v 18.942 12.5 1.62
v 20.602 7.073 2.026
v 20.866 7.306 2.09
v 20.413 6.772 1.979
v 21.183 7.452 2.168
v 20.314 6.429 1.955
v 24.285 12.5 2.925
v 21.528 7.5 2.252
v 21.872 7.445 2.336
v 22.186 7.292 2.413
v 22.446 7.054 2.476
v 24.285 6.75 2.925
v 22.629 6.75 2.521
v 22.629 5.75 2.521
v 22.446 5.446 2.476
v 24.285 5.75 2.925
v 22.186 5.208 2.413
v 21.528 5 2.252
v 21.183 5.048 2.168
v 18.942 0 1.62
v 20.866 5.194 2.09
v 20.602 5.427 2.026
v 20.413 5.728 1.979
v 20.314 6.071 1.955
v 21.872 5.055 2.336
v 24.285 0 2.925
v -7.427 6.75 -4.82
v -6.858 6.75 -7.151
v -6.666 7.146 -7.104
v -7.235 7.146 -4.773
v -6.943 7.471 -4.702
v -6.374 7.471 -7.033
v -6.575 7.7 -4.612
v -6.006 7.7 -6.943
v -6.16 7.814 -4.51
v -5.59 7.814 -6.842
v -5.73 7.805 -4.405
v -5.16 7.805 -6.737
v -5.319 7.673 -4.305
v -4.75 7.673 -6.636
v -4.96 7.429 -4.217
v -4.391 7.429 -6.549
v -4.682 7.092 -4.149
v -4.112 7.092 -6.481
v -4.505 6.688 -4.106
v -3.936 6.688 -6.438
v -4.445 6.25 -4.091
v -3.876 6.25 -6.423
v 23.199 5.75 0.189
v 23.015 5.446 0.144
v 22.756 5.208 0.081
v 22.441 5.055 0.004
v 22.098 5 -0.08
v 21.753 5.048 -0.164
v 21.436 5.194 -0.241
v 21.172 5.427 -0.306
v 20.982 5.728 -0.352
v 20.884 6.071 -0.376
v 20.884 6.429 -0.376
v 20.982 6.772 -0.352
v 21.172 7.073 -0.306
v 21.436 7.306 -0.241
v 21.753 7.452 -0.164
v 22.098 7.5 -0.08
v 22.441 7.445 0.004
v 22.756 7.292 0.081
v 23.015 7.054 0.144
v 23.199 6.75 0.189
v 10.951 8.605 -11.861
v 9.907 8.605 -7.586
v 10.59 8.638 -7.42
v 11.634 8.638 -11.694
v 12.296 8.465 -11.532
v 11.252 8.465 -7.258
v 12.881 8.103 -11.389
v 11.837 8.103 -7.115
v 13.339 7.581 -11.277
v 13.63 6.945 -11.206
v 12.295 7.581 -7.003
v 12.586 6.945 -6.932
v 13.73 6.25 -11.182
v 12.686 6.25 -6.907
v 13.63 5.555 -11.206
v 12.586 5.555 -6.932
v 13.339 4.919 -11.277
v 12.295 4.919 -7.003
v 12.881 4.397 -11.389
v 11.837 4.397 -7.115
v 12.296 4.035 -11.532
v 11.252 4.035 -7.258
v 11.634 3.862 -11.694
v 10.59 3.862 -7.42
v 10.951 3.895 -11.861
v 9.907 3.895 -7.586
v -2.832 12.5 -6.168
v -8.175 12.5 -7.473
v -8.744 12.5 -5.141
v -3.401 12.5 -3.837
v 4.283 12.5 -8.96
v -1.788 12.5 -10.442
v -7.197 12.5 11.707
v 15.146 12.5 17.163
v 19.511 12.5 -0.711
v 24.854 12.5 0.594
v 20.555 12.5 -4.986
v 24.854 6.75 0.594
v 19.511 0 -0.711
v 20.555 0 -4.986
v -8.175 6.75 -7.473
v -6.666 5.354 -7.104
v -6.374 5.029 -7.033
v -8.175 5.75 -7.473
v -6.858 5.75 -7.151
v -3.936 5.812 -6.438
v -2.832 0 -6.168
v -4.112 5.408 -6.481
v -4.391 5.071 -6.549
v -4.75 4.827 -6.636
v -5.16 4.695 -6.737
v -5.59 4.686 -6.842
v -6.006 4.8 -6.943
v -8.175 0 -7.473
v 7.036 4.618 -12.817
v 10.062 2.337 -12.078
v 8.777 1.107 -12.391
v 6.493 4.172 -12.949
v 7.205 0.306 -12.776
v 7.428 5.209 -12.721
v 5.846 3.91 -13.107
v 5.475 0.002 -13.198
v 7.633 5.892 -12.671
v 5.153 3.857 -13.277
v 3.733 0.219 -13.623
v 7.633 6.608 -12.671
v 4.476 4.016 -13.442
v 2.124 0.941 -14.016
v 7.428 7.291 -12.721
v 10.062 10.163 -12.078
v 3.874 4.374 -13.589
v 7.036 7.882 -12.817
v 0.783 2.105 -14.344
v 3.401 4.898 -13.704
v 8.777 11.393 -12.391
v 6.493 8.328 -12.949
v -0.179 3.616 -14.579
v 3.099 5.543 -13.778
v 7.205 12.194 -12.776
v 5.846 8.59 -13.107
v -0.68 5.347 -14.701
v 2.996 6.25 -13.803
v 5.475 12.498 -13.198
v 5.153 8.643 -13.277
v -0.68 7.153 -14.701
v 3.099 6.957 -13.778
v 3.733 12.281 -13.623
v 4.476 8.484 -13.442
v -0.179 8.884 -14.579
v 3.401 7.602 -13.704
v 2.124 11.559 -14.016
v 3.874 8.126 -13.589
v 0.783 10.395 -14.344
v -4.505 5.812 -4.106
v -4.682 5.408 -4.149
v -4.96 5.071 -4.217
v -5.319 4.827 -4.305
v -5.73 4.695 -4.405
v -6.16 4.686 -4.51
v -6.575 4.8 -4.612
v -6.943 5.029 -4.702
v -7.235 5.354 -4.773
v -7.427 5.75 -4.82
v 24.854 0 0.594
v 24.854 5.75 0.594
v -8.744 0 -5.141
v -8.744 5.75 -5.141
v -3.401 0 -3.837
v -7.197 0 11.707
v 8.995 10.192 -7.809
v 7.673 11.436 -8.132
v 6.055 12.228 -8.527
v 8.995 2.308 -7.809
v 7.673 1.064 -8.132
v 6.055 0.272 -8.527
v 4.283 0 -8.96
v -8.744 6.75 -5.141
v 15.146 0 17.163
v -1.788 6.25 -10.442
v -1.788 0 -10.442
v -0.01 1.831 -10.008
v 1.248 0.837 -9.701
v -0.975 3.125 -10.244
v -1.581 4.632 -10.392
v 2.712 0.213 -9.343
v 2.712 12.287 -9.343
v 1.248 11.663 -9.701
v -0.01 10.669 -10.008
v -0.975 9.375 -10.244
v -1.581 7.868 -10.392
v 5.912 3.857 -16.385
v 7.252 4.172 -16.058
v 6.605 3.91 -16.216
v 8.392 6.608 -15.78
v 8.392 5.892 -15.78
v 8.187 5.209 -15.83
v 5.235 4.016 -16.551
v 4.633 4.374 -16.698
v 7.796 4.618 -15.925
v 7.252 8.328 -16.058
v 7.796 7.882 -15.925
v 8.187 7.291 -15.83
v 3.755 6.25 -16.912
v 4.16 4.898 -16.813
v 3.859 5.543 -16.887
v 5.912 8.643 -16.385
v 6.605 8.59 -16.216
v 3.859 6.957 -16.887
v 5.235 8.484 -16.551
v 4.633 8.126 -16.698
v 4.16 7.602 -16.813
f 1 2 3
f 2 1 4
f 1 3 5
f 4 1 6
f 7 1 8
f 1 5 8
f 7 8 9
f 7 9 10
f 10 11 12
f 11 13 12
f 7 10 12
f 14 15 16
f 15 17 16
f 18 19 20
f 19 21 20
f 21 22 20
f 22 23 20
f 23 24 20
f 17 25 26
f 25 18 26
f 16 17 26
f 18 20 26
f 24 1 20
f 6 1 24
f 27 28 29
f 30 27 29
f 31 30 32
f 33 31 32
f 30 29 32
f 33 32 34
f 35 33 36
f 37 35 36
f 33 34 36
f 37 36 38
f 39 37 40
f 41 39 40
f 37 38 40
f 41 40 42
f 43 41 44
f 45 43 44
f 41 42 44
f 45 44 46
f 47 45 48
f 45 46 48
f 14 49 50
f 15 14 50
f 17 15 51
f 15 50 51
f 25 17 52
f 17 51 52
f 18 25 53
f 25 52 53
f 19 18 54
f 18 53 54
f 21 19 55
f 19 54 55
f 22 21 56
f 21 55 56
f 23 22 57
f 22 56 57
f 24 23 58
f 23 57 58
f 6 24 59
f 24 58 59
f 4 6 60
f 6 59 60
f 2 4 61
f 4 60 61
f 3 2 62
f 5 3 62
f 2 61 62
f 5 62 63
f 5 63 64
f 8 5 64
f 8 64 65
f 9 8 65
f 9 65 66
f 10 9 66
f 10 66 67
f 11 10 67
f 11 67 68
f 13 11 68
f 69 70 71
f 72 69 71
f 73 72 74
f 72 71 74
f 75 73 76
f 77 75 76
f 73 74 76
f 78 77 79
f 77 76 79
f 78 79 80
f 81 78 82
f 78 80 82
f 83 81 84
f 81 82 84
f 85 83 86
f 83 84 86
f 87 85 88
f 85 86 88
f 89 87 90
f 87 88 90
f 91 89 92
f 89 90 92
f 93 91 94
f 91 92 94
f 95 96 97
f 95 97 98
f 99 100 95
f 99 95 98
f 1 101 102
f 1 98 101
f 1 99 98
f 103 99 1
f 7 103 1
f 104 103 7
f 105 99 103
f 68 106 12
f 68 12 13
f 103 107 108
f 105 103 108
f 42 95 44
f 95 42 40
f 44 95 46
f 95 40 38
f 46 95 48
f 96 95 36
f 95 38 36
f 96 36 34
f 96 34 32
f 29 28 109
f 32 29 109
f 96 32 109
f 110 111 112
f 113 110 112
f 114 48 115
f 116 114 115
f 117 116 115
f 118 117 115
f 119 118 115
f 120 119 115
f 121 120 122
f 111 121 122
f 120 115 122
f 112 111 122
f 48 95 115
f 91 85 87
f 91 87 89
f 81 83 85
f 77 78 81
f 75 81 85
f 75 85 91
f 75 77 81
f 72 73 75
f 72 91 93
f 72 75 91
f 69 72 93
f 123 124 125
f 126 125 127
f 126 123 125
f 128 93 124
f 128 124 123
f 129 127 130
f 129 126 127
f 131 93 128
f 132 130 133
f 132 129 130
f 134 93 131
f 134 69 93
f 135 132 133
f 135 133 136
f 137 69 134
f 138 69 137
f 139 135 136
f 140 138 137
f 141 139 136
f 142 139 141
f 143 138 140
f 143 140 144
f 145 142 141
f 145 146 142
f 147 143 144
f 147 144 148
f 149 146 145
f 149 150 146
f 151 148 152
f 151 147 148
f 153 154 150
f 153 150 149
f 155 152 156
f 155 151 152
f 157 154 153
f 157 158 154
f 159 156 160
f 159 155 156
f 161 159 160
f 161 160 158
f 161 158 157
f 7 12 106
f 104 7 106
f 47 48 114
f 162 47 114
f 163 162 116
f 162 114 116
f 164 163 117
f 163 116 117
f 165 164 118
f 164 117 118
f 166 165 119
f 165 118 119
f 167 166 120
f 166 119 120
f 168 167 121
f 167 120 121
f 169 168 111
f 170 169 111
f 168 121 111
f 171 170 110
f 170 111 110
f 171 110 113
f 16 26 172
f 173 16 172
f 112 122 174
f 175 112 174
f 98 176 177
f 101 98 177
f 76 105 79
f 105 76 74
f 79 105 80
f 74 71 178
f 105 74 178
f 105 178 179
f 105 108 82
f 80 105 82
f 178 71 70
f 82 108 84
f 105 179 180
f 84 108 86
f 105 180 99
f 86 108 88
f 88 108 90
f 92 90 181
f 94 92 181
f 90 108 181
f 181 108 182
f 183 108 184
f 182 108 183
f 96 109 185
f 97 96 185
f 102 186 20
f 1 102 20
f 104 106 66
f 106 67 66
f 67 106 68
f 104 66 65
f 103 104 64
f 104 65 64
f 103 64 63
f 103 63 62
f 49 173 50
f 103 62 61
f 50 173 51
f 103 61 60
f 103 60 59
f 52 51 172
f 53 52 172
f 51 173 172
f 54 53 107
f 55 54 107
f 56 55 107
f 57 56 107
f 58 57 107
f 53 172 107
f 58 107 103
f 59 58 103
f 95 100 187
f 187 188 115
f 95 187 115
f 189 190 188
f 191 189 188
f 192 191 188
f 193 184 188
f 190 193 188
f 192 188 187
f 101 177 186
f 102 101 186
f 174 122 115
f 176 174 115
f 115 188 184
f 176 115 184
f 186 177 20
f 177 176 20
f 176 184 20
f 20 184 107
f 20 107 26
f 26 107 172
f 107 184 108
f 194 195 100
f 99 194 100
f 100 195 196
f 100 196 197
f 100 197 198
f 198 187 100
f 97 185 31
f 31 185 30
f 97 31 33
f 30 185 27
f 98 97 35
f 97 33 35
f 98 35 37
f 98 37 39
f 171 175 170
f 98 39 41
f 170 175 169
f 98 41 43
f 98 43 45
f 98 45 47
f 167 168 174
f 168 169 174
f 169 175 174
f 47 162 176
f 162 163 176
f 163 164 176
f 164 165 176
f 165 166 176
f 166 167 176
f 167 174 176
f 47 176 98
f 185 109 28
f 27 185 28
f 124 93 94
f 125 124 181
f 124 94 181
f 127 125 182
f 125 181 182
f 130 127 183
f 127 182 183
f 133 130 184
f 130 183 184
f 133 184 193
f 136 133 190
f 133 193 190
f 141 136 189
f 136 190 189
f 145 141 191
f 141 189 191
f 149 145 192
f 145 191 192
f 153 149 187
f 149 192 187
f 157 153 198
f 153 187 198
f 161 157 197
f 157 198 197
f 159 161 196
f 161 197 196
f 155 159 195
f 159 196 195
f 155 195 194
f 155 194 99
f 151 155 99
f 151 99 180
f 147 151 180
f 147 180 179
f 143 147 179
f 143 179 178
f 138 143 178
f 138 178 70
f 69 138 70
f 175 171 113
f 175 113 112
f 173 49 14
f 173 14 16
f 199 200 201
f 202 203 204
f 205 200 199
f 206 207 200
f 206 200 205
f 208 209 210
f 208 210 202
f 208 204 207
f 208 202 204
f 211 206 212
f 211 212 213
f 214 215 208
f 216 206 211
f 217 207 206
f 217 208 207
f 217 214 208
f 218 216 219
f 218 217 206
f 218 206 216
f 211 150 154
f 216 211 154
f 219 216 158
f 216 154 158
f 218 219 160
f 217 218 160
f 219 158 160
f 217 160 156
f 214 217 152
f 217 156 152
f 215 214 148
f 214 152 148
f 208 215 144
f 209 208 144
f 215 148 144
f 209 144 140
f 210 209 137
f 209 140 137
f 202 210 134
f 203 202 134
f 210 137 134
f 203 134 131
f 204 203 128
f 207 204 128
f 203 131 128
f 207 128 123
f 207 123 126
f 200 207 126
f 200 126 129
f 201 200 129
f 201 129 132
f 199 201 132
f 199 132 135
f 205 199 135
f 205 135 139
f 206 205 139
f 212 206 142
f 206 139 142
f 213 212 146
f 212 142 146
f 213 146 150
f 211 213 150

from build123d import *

# Parameters (mm, degrees)
BOSS_EXTRUDE1_DEPTH = 12.5
SKETCH2_R           = 6.25
SKETCH2_R_2         = 2.4
BOSS_EXTRUDE2_DEPTH = 4.4
SKETCH3_R           = 2.4
BOSS_EXTRUDE3_DEPTH = 3.2
SKETCH4_R           = 1.25
CUT_EXTRUDE1_DEPTH  = 3.2
CUT_EXTRUDE2_DEPTH  = 3.2


with BuildPart() as part:
    # Sketch1 → Boss-Extrude1 (new body)
    with BuildSketch(Plane(origin=(0, 0, 0), x_dir=(1, 0, 0), z_dir=(0, 1, 0))):
        Polygon((-7.197362046, -11.706627962), (15.14596589, -17.163339125), (18.941938873, -1.620154473), (24.284908597, -2.925020186), (24.854304545, -0.593542489), (19.511334821, 0.711323224), (20.555227391, 4.985699003), (-1.788100545, 10.442410167), (-2.831993116, 6.168034388), (-8.17496284, 7.472900101), (-8.744358787, 5.141422403), (-3.401389063, 3.83655669), align=None)
    extrude(amount=BOSS_EXTRUDE1_DEPTH)

    # Sketch2 → Boss-Extrude2 (add)
    with BuildSketch(Plane(origin=(2.306064383, 0, -9.442528881), x_dir=(-0.971449041, 0, -0.237248311), z_dir=(0.237248311, 0, -0.971449041))):
        with Locations((-2.035507261, 6.25)):
            Circle(SKETCH2_R)
        with Locations((-8.285507261, 6.25)):
            Circle(SKETCH2_R_2)
    extrude(amount=BOSS_EXTRUDE2_DEPTH)

    # Sketch3 → Boss-Extrude3 (add)
    with BuildSketch(Plane(origin=(3.349956953, 0, -13.71690466), x_dir=(-0.971449041, 0, -0.237248311), z_dir=(0.237248311, 0, -0.971449041))):
        with Locations((-2.035507261, 6.25)):
            Circle(SKETCH3_R)
    extrude(amount=BOSS_EXTRUDE3_DEPTH)

    # Sketch4 → Cut-Extrude1 (cut)
    with BuildSketch(Plane(origin=(1.262171813, 0, -5.168153102), x_dir=(-0.971449041, 0, -0.237248311), z_dir=(0.237248311, 0, -0.971449041))):
        with Locations((-21.435507261, 6.25)):
            Circle(SKETCH4_R)
        Polygon((-24.285507261, 6.25), (-24.285507261, 6.75), (-22.581151185, 6.75), (-22.581151185, 5.75), (-24.285507261, 5.75), align=None)
    extrude(amount=-CUT_EXTRUDE1_DEPTH, mode=Mode.SUBTRACT)

    # Sketch5 → Cut-Extrude2 (cut)
    with BuildSketch(Plane(origin=(1.262171813, 0, -5.168153102), x_dir=(-0.971449041, 0, -0.237248311), z_dir=(0.237248311, 0, -0.971449041))):
        with BuildLine():
            ThreePointArc((8.358804544, 6.75), (6.611198873, 7.805252387), (5.288749178, 6.25))
            Line((5.288749178, 6.25), (6.864492739, 6.25))
            Line((6.864492739, 6.25), (7.879253637, 6.25))
            Line((7.879253637, 6.25), (7.879253637, 6.75))
            Line((7.879253637, 6.75), (8.358804544, 6.75))
        make_face()
        with BuildLine():
            Line((6.864492739, 6.25), (5.288749178, 6.25))
            ThreePointArc((5.288749178, 6.25), (6.611198873, 4.694747613), (8.358804544, 5.75))
            Line((8.358804544, 5.75), (7.879253637, 5.75))
            Line((7.879253637, 5.75), (7.879253637, 6.25))
            Line((7.879253637, 6.25), (6.864492739, 6.25))
        make_face()
        with BuildLine():
            ThreePointArc((8.4402363, 6.25), (8.419745126, 5.996706134), (8.358804544, 5.75))
            Line((8.358804544, 5.75), (9.714492739, 5.75))
            Line((9.714492739, 5.75), (9.714492739, 6.25))
            Line((9.714492739, 6.25), (8.4402363, 6.25))
        make_face()
        with BuildLine():
            Line((9.714492739, 6.75), (8.358804544, 6.75))
            ThreePointArc((8.358804544, 6.75), (8.419745126, 6.503293866), (8.4402363, 6.25))
            Line((8.4402363, 6.25), (9.714492739, 6.25))
            Line((9.714492739, 6.25), (9.714492739, 6.75))
        make_face()
        with BuildLine():
            ThreePointArc((8.4402363, 6.25), (8.419745126, 6.503293866), (8.358804544, 6.75))
            Line((8.358804544, 6.75), (7.879253637, 6.75))
            Line((7.879253637, 6.75), (7.879253637, 6.25))
            Line((7.879253637, 6.25), (8.4402363, 6.25))
        make_face()
        with BuildLine():
            Line((7.879253637, 5.75), (8.358804544, 5.75))
            ThreePointArc((8.358804544, 5.75), (8.419745126, 5.996706134), (8.4402363, 6.25))
            Line((8.4402363, 6.25), (7.879253637, 6.25))
            Line((7.879253637, 6.25), (7.879253637, 5.75))
        make_face()
    extrude(amount=-CUT_EXTRUDE2_DEPTH, mode=Mode.SUBTRACT)


solid = part.part
